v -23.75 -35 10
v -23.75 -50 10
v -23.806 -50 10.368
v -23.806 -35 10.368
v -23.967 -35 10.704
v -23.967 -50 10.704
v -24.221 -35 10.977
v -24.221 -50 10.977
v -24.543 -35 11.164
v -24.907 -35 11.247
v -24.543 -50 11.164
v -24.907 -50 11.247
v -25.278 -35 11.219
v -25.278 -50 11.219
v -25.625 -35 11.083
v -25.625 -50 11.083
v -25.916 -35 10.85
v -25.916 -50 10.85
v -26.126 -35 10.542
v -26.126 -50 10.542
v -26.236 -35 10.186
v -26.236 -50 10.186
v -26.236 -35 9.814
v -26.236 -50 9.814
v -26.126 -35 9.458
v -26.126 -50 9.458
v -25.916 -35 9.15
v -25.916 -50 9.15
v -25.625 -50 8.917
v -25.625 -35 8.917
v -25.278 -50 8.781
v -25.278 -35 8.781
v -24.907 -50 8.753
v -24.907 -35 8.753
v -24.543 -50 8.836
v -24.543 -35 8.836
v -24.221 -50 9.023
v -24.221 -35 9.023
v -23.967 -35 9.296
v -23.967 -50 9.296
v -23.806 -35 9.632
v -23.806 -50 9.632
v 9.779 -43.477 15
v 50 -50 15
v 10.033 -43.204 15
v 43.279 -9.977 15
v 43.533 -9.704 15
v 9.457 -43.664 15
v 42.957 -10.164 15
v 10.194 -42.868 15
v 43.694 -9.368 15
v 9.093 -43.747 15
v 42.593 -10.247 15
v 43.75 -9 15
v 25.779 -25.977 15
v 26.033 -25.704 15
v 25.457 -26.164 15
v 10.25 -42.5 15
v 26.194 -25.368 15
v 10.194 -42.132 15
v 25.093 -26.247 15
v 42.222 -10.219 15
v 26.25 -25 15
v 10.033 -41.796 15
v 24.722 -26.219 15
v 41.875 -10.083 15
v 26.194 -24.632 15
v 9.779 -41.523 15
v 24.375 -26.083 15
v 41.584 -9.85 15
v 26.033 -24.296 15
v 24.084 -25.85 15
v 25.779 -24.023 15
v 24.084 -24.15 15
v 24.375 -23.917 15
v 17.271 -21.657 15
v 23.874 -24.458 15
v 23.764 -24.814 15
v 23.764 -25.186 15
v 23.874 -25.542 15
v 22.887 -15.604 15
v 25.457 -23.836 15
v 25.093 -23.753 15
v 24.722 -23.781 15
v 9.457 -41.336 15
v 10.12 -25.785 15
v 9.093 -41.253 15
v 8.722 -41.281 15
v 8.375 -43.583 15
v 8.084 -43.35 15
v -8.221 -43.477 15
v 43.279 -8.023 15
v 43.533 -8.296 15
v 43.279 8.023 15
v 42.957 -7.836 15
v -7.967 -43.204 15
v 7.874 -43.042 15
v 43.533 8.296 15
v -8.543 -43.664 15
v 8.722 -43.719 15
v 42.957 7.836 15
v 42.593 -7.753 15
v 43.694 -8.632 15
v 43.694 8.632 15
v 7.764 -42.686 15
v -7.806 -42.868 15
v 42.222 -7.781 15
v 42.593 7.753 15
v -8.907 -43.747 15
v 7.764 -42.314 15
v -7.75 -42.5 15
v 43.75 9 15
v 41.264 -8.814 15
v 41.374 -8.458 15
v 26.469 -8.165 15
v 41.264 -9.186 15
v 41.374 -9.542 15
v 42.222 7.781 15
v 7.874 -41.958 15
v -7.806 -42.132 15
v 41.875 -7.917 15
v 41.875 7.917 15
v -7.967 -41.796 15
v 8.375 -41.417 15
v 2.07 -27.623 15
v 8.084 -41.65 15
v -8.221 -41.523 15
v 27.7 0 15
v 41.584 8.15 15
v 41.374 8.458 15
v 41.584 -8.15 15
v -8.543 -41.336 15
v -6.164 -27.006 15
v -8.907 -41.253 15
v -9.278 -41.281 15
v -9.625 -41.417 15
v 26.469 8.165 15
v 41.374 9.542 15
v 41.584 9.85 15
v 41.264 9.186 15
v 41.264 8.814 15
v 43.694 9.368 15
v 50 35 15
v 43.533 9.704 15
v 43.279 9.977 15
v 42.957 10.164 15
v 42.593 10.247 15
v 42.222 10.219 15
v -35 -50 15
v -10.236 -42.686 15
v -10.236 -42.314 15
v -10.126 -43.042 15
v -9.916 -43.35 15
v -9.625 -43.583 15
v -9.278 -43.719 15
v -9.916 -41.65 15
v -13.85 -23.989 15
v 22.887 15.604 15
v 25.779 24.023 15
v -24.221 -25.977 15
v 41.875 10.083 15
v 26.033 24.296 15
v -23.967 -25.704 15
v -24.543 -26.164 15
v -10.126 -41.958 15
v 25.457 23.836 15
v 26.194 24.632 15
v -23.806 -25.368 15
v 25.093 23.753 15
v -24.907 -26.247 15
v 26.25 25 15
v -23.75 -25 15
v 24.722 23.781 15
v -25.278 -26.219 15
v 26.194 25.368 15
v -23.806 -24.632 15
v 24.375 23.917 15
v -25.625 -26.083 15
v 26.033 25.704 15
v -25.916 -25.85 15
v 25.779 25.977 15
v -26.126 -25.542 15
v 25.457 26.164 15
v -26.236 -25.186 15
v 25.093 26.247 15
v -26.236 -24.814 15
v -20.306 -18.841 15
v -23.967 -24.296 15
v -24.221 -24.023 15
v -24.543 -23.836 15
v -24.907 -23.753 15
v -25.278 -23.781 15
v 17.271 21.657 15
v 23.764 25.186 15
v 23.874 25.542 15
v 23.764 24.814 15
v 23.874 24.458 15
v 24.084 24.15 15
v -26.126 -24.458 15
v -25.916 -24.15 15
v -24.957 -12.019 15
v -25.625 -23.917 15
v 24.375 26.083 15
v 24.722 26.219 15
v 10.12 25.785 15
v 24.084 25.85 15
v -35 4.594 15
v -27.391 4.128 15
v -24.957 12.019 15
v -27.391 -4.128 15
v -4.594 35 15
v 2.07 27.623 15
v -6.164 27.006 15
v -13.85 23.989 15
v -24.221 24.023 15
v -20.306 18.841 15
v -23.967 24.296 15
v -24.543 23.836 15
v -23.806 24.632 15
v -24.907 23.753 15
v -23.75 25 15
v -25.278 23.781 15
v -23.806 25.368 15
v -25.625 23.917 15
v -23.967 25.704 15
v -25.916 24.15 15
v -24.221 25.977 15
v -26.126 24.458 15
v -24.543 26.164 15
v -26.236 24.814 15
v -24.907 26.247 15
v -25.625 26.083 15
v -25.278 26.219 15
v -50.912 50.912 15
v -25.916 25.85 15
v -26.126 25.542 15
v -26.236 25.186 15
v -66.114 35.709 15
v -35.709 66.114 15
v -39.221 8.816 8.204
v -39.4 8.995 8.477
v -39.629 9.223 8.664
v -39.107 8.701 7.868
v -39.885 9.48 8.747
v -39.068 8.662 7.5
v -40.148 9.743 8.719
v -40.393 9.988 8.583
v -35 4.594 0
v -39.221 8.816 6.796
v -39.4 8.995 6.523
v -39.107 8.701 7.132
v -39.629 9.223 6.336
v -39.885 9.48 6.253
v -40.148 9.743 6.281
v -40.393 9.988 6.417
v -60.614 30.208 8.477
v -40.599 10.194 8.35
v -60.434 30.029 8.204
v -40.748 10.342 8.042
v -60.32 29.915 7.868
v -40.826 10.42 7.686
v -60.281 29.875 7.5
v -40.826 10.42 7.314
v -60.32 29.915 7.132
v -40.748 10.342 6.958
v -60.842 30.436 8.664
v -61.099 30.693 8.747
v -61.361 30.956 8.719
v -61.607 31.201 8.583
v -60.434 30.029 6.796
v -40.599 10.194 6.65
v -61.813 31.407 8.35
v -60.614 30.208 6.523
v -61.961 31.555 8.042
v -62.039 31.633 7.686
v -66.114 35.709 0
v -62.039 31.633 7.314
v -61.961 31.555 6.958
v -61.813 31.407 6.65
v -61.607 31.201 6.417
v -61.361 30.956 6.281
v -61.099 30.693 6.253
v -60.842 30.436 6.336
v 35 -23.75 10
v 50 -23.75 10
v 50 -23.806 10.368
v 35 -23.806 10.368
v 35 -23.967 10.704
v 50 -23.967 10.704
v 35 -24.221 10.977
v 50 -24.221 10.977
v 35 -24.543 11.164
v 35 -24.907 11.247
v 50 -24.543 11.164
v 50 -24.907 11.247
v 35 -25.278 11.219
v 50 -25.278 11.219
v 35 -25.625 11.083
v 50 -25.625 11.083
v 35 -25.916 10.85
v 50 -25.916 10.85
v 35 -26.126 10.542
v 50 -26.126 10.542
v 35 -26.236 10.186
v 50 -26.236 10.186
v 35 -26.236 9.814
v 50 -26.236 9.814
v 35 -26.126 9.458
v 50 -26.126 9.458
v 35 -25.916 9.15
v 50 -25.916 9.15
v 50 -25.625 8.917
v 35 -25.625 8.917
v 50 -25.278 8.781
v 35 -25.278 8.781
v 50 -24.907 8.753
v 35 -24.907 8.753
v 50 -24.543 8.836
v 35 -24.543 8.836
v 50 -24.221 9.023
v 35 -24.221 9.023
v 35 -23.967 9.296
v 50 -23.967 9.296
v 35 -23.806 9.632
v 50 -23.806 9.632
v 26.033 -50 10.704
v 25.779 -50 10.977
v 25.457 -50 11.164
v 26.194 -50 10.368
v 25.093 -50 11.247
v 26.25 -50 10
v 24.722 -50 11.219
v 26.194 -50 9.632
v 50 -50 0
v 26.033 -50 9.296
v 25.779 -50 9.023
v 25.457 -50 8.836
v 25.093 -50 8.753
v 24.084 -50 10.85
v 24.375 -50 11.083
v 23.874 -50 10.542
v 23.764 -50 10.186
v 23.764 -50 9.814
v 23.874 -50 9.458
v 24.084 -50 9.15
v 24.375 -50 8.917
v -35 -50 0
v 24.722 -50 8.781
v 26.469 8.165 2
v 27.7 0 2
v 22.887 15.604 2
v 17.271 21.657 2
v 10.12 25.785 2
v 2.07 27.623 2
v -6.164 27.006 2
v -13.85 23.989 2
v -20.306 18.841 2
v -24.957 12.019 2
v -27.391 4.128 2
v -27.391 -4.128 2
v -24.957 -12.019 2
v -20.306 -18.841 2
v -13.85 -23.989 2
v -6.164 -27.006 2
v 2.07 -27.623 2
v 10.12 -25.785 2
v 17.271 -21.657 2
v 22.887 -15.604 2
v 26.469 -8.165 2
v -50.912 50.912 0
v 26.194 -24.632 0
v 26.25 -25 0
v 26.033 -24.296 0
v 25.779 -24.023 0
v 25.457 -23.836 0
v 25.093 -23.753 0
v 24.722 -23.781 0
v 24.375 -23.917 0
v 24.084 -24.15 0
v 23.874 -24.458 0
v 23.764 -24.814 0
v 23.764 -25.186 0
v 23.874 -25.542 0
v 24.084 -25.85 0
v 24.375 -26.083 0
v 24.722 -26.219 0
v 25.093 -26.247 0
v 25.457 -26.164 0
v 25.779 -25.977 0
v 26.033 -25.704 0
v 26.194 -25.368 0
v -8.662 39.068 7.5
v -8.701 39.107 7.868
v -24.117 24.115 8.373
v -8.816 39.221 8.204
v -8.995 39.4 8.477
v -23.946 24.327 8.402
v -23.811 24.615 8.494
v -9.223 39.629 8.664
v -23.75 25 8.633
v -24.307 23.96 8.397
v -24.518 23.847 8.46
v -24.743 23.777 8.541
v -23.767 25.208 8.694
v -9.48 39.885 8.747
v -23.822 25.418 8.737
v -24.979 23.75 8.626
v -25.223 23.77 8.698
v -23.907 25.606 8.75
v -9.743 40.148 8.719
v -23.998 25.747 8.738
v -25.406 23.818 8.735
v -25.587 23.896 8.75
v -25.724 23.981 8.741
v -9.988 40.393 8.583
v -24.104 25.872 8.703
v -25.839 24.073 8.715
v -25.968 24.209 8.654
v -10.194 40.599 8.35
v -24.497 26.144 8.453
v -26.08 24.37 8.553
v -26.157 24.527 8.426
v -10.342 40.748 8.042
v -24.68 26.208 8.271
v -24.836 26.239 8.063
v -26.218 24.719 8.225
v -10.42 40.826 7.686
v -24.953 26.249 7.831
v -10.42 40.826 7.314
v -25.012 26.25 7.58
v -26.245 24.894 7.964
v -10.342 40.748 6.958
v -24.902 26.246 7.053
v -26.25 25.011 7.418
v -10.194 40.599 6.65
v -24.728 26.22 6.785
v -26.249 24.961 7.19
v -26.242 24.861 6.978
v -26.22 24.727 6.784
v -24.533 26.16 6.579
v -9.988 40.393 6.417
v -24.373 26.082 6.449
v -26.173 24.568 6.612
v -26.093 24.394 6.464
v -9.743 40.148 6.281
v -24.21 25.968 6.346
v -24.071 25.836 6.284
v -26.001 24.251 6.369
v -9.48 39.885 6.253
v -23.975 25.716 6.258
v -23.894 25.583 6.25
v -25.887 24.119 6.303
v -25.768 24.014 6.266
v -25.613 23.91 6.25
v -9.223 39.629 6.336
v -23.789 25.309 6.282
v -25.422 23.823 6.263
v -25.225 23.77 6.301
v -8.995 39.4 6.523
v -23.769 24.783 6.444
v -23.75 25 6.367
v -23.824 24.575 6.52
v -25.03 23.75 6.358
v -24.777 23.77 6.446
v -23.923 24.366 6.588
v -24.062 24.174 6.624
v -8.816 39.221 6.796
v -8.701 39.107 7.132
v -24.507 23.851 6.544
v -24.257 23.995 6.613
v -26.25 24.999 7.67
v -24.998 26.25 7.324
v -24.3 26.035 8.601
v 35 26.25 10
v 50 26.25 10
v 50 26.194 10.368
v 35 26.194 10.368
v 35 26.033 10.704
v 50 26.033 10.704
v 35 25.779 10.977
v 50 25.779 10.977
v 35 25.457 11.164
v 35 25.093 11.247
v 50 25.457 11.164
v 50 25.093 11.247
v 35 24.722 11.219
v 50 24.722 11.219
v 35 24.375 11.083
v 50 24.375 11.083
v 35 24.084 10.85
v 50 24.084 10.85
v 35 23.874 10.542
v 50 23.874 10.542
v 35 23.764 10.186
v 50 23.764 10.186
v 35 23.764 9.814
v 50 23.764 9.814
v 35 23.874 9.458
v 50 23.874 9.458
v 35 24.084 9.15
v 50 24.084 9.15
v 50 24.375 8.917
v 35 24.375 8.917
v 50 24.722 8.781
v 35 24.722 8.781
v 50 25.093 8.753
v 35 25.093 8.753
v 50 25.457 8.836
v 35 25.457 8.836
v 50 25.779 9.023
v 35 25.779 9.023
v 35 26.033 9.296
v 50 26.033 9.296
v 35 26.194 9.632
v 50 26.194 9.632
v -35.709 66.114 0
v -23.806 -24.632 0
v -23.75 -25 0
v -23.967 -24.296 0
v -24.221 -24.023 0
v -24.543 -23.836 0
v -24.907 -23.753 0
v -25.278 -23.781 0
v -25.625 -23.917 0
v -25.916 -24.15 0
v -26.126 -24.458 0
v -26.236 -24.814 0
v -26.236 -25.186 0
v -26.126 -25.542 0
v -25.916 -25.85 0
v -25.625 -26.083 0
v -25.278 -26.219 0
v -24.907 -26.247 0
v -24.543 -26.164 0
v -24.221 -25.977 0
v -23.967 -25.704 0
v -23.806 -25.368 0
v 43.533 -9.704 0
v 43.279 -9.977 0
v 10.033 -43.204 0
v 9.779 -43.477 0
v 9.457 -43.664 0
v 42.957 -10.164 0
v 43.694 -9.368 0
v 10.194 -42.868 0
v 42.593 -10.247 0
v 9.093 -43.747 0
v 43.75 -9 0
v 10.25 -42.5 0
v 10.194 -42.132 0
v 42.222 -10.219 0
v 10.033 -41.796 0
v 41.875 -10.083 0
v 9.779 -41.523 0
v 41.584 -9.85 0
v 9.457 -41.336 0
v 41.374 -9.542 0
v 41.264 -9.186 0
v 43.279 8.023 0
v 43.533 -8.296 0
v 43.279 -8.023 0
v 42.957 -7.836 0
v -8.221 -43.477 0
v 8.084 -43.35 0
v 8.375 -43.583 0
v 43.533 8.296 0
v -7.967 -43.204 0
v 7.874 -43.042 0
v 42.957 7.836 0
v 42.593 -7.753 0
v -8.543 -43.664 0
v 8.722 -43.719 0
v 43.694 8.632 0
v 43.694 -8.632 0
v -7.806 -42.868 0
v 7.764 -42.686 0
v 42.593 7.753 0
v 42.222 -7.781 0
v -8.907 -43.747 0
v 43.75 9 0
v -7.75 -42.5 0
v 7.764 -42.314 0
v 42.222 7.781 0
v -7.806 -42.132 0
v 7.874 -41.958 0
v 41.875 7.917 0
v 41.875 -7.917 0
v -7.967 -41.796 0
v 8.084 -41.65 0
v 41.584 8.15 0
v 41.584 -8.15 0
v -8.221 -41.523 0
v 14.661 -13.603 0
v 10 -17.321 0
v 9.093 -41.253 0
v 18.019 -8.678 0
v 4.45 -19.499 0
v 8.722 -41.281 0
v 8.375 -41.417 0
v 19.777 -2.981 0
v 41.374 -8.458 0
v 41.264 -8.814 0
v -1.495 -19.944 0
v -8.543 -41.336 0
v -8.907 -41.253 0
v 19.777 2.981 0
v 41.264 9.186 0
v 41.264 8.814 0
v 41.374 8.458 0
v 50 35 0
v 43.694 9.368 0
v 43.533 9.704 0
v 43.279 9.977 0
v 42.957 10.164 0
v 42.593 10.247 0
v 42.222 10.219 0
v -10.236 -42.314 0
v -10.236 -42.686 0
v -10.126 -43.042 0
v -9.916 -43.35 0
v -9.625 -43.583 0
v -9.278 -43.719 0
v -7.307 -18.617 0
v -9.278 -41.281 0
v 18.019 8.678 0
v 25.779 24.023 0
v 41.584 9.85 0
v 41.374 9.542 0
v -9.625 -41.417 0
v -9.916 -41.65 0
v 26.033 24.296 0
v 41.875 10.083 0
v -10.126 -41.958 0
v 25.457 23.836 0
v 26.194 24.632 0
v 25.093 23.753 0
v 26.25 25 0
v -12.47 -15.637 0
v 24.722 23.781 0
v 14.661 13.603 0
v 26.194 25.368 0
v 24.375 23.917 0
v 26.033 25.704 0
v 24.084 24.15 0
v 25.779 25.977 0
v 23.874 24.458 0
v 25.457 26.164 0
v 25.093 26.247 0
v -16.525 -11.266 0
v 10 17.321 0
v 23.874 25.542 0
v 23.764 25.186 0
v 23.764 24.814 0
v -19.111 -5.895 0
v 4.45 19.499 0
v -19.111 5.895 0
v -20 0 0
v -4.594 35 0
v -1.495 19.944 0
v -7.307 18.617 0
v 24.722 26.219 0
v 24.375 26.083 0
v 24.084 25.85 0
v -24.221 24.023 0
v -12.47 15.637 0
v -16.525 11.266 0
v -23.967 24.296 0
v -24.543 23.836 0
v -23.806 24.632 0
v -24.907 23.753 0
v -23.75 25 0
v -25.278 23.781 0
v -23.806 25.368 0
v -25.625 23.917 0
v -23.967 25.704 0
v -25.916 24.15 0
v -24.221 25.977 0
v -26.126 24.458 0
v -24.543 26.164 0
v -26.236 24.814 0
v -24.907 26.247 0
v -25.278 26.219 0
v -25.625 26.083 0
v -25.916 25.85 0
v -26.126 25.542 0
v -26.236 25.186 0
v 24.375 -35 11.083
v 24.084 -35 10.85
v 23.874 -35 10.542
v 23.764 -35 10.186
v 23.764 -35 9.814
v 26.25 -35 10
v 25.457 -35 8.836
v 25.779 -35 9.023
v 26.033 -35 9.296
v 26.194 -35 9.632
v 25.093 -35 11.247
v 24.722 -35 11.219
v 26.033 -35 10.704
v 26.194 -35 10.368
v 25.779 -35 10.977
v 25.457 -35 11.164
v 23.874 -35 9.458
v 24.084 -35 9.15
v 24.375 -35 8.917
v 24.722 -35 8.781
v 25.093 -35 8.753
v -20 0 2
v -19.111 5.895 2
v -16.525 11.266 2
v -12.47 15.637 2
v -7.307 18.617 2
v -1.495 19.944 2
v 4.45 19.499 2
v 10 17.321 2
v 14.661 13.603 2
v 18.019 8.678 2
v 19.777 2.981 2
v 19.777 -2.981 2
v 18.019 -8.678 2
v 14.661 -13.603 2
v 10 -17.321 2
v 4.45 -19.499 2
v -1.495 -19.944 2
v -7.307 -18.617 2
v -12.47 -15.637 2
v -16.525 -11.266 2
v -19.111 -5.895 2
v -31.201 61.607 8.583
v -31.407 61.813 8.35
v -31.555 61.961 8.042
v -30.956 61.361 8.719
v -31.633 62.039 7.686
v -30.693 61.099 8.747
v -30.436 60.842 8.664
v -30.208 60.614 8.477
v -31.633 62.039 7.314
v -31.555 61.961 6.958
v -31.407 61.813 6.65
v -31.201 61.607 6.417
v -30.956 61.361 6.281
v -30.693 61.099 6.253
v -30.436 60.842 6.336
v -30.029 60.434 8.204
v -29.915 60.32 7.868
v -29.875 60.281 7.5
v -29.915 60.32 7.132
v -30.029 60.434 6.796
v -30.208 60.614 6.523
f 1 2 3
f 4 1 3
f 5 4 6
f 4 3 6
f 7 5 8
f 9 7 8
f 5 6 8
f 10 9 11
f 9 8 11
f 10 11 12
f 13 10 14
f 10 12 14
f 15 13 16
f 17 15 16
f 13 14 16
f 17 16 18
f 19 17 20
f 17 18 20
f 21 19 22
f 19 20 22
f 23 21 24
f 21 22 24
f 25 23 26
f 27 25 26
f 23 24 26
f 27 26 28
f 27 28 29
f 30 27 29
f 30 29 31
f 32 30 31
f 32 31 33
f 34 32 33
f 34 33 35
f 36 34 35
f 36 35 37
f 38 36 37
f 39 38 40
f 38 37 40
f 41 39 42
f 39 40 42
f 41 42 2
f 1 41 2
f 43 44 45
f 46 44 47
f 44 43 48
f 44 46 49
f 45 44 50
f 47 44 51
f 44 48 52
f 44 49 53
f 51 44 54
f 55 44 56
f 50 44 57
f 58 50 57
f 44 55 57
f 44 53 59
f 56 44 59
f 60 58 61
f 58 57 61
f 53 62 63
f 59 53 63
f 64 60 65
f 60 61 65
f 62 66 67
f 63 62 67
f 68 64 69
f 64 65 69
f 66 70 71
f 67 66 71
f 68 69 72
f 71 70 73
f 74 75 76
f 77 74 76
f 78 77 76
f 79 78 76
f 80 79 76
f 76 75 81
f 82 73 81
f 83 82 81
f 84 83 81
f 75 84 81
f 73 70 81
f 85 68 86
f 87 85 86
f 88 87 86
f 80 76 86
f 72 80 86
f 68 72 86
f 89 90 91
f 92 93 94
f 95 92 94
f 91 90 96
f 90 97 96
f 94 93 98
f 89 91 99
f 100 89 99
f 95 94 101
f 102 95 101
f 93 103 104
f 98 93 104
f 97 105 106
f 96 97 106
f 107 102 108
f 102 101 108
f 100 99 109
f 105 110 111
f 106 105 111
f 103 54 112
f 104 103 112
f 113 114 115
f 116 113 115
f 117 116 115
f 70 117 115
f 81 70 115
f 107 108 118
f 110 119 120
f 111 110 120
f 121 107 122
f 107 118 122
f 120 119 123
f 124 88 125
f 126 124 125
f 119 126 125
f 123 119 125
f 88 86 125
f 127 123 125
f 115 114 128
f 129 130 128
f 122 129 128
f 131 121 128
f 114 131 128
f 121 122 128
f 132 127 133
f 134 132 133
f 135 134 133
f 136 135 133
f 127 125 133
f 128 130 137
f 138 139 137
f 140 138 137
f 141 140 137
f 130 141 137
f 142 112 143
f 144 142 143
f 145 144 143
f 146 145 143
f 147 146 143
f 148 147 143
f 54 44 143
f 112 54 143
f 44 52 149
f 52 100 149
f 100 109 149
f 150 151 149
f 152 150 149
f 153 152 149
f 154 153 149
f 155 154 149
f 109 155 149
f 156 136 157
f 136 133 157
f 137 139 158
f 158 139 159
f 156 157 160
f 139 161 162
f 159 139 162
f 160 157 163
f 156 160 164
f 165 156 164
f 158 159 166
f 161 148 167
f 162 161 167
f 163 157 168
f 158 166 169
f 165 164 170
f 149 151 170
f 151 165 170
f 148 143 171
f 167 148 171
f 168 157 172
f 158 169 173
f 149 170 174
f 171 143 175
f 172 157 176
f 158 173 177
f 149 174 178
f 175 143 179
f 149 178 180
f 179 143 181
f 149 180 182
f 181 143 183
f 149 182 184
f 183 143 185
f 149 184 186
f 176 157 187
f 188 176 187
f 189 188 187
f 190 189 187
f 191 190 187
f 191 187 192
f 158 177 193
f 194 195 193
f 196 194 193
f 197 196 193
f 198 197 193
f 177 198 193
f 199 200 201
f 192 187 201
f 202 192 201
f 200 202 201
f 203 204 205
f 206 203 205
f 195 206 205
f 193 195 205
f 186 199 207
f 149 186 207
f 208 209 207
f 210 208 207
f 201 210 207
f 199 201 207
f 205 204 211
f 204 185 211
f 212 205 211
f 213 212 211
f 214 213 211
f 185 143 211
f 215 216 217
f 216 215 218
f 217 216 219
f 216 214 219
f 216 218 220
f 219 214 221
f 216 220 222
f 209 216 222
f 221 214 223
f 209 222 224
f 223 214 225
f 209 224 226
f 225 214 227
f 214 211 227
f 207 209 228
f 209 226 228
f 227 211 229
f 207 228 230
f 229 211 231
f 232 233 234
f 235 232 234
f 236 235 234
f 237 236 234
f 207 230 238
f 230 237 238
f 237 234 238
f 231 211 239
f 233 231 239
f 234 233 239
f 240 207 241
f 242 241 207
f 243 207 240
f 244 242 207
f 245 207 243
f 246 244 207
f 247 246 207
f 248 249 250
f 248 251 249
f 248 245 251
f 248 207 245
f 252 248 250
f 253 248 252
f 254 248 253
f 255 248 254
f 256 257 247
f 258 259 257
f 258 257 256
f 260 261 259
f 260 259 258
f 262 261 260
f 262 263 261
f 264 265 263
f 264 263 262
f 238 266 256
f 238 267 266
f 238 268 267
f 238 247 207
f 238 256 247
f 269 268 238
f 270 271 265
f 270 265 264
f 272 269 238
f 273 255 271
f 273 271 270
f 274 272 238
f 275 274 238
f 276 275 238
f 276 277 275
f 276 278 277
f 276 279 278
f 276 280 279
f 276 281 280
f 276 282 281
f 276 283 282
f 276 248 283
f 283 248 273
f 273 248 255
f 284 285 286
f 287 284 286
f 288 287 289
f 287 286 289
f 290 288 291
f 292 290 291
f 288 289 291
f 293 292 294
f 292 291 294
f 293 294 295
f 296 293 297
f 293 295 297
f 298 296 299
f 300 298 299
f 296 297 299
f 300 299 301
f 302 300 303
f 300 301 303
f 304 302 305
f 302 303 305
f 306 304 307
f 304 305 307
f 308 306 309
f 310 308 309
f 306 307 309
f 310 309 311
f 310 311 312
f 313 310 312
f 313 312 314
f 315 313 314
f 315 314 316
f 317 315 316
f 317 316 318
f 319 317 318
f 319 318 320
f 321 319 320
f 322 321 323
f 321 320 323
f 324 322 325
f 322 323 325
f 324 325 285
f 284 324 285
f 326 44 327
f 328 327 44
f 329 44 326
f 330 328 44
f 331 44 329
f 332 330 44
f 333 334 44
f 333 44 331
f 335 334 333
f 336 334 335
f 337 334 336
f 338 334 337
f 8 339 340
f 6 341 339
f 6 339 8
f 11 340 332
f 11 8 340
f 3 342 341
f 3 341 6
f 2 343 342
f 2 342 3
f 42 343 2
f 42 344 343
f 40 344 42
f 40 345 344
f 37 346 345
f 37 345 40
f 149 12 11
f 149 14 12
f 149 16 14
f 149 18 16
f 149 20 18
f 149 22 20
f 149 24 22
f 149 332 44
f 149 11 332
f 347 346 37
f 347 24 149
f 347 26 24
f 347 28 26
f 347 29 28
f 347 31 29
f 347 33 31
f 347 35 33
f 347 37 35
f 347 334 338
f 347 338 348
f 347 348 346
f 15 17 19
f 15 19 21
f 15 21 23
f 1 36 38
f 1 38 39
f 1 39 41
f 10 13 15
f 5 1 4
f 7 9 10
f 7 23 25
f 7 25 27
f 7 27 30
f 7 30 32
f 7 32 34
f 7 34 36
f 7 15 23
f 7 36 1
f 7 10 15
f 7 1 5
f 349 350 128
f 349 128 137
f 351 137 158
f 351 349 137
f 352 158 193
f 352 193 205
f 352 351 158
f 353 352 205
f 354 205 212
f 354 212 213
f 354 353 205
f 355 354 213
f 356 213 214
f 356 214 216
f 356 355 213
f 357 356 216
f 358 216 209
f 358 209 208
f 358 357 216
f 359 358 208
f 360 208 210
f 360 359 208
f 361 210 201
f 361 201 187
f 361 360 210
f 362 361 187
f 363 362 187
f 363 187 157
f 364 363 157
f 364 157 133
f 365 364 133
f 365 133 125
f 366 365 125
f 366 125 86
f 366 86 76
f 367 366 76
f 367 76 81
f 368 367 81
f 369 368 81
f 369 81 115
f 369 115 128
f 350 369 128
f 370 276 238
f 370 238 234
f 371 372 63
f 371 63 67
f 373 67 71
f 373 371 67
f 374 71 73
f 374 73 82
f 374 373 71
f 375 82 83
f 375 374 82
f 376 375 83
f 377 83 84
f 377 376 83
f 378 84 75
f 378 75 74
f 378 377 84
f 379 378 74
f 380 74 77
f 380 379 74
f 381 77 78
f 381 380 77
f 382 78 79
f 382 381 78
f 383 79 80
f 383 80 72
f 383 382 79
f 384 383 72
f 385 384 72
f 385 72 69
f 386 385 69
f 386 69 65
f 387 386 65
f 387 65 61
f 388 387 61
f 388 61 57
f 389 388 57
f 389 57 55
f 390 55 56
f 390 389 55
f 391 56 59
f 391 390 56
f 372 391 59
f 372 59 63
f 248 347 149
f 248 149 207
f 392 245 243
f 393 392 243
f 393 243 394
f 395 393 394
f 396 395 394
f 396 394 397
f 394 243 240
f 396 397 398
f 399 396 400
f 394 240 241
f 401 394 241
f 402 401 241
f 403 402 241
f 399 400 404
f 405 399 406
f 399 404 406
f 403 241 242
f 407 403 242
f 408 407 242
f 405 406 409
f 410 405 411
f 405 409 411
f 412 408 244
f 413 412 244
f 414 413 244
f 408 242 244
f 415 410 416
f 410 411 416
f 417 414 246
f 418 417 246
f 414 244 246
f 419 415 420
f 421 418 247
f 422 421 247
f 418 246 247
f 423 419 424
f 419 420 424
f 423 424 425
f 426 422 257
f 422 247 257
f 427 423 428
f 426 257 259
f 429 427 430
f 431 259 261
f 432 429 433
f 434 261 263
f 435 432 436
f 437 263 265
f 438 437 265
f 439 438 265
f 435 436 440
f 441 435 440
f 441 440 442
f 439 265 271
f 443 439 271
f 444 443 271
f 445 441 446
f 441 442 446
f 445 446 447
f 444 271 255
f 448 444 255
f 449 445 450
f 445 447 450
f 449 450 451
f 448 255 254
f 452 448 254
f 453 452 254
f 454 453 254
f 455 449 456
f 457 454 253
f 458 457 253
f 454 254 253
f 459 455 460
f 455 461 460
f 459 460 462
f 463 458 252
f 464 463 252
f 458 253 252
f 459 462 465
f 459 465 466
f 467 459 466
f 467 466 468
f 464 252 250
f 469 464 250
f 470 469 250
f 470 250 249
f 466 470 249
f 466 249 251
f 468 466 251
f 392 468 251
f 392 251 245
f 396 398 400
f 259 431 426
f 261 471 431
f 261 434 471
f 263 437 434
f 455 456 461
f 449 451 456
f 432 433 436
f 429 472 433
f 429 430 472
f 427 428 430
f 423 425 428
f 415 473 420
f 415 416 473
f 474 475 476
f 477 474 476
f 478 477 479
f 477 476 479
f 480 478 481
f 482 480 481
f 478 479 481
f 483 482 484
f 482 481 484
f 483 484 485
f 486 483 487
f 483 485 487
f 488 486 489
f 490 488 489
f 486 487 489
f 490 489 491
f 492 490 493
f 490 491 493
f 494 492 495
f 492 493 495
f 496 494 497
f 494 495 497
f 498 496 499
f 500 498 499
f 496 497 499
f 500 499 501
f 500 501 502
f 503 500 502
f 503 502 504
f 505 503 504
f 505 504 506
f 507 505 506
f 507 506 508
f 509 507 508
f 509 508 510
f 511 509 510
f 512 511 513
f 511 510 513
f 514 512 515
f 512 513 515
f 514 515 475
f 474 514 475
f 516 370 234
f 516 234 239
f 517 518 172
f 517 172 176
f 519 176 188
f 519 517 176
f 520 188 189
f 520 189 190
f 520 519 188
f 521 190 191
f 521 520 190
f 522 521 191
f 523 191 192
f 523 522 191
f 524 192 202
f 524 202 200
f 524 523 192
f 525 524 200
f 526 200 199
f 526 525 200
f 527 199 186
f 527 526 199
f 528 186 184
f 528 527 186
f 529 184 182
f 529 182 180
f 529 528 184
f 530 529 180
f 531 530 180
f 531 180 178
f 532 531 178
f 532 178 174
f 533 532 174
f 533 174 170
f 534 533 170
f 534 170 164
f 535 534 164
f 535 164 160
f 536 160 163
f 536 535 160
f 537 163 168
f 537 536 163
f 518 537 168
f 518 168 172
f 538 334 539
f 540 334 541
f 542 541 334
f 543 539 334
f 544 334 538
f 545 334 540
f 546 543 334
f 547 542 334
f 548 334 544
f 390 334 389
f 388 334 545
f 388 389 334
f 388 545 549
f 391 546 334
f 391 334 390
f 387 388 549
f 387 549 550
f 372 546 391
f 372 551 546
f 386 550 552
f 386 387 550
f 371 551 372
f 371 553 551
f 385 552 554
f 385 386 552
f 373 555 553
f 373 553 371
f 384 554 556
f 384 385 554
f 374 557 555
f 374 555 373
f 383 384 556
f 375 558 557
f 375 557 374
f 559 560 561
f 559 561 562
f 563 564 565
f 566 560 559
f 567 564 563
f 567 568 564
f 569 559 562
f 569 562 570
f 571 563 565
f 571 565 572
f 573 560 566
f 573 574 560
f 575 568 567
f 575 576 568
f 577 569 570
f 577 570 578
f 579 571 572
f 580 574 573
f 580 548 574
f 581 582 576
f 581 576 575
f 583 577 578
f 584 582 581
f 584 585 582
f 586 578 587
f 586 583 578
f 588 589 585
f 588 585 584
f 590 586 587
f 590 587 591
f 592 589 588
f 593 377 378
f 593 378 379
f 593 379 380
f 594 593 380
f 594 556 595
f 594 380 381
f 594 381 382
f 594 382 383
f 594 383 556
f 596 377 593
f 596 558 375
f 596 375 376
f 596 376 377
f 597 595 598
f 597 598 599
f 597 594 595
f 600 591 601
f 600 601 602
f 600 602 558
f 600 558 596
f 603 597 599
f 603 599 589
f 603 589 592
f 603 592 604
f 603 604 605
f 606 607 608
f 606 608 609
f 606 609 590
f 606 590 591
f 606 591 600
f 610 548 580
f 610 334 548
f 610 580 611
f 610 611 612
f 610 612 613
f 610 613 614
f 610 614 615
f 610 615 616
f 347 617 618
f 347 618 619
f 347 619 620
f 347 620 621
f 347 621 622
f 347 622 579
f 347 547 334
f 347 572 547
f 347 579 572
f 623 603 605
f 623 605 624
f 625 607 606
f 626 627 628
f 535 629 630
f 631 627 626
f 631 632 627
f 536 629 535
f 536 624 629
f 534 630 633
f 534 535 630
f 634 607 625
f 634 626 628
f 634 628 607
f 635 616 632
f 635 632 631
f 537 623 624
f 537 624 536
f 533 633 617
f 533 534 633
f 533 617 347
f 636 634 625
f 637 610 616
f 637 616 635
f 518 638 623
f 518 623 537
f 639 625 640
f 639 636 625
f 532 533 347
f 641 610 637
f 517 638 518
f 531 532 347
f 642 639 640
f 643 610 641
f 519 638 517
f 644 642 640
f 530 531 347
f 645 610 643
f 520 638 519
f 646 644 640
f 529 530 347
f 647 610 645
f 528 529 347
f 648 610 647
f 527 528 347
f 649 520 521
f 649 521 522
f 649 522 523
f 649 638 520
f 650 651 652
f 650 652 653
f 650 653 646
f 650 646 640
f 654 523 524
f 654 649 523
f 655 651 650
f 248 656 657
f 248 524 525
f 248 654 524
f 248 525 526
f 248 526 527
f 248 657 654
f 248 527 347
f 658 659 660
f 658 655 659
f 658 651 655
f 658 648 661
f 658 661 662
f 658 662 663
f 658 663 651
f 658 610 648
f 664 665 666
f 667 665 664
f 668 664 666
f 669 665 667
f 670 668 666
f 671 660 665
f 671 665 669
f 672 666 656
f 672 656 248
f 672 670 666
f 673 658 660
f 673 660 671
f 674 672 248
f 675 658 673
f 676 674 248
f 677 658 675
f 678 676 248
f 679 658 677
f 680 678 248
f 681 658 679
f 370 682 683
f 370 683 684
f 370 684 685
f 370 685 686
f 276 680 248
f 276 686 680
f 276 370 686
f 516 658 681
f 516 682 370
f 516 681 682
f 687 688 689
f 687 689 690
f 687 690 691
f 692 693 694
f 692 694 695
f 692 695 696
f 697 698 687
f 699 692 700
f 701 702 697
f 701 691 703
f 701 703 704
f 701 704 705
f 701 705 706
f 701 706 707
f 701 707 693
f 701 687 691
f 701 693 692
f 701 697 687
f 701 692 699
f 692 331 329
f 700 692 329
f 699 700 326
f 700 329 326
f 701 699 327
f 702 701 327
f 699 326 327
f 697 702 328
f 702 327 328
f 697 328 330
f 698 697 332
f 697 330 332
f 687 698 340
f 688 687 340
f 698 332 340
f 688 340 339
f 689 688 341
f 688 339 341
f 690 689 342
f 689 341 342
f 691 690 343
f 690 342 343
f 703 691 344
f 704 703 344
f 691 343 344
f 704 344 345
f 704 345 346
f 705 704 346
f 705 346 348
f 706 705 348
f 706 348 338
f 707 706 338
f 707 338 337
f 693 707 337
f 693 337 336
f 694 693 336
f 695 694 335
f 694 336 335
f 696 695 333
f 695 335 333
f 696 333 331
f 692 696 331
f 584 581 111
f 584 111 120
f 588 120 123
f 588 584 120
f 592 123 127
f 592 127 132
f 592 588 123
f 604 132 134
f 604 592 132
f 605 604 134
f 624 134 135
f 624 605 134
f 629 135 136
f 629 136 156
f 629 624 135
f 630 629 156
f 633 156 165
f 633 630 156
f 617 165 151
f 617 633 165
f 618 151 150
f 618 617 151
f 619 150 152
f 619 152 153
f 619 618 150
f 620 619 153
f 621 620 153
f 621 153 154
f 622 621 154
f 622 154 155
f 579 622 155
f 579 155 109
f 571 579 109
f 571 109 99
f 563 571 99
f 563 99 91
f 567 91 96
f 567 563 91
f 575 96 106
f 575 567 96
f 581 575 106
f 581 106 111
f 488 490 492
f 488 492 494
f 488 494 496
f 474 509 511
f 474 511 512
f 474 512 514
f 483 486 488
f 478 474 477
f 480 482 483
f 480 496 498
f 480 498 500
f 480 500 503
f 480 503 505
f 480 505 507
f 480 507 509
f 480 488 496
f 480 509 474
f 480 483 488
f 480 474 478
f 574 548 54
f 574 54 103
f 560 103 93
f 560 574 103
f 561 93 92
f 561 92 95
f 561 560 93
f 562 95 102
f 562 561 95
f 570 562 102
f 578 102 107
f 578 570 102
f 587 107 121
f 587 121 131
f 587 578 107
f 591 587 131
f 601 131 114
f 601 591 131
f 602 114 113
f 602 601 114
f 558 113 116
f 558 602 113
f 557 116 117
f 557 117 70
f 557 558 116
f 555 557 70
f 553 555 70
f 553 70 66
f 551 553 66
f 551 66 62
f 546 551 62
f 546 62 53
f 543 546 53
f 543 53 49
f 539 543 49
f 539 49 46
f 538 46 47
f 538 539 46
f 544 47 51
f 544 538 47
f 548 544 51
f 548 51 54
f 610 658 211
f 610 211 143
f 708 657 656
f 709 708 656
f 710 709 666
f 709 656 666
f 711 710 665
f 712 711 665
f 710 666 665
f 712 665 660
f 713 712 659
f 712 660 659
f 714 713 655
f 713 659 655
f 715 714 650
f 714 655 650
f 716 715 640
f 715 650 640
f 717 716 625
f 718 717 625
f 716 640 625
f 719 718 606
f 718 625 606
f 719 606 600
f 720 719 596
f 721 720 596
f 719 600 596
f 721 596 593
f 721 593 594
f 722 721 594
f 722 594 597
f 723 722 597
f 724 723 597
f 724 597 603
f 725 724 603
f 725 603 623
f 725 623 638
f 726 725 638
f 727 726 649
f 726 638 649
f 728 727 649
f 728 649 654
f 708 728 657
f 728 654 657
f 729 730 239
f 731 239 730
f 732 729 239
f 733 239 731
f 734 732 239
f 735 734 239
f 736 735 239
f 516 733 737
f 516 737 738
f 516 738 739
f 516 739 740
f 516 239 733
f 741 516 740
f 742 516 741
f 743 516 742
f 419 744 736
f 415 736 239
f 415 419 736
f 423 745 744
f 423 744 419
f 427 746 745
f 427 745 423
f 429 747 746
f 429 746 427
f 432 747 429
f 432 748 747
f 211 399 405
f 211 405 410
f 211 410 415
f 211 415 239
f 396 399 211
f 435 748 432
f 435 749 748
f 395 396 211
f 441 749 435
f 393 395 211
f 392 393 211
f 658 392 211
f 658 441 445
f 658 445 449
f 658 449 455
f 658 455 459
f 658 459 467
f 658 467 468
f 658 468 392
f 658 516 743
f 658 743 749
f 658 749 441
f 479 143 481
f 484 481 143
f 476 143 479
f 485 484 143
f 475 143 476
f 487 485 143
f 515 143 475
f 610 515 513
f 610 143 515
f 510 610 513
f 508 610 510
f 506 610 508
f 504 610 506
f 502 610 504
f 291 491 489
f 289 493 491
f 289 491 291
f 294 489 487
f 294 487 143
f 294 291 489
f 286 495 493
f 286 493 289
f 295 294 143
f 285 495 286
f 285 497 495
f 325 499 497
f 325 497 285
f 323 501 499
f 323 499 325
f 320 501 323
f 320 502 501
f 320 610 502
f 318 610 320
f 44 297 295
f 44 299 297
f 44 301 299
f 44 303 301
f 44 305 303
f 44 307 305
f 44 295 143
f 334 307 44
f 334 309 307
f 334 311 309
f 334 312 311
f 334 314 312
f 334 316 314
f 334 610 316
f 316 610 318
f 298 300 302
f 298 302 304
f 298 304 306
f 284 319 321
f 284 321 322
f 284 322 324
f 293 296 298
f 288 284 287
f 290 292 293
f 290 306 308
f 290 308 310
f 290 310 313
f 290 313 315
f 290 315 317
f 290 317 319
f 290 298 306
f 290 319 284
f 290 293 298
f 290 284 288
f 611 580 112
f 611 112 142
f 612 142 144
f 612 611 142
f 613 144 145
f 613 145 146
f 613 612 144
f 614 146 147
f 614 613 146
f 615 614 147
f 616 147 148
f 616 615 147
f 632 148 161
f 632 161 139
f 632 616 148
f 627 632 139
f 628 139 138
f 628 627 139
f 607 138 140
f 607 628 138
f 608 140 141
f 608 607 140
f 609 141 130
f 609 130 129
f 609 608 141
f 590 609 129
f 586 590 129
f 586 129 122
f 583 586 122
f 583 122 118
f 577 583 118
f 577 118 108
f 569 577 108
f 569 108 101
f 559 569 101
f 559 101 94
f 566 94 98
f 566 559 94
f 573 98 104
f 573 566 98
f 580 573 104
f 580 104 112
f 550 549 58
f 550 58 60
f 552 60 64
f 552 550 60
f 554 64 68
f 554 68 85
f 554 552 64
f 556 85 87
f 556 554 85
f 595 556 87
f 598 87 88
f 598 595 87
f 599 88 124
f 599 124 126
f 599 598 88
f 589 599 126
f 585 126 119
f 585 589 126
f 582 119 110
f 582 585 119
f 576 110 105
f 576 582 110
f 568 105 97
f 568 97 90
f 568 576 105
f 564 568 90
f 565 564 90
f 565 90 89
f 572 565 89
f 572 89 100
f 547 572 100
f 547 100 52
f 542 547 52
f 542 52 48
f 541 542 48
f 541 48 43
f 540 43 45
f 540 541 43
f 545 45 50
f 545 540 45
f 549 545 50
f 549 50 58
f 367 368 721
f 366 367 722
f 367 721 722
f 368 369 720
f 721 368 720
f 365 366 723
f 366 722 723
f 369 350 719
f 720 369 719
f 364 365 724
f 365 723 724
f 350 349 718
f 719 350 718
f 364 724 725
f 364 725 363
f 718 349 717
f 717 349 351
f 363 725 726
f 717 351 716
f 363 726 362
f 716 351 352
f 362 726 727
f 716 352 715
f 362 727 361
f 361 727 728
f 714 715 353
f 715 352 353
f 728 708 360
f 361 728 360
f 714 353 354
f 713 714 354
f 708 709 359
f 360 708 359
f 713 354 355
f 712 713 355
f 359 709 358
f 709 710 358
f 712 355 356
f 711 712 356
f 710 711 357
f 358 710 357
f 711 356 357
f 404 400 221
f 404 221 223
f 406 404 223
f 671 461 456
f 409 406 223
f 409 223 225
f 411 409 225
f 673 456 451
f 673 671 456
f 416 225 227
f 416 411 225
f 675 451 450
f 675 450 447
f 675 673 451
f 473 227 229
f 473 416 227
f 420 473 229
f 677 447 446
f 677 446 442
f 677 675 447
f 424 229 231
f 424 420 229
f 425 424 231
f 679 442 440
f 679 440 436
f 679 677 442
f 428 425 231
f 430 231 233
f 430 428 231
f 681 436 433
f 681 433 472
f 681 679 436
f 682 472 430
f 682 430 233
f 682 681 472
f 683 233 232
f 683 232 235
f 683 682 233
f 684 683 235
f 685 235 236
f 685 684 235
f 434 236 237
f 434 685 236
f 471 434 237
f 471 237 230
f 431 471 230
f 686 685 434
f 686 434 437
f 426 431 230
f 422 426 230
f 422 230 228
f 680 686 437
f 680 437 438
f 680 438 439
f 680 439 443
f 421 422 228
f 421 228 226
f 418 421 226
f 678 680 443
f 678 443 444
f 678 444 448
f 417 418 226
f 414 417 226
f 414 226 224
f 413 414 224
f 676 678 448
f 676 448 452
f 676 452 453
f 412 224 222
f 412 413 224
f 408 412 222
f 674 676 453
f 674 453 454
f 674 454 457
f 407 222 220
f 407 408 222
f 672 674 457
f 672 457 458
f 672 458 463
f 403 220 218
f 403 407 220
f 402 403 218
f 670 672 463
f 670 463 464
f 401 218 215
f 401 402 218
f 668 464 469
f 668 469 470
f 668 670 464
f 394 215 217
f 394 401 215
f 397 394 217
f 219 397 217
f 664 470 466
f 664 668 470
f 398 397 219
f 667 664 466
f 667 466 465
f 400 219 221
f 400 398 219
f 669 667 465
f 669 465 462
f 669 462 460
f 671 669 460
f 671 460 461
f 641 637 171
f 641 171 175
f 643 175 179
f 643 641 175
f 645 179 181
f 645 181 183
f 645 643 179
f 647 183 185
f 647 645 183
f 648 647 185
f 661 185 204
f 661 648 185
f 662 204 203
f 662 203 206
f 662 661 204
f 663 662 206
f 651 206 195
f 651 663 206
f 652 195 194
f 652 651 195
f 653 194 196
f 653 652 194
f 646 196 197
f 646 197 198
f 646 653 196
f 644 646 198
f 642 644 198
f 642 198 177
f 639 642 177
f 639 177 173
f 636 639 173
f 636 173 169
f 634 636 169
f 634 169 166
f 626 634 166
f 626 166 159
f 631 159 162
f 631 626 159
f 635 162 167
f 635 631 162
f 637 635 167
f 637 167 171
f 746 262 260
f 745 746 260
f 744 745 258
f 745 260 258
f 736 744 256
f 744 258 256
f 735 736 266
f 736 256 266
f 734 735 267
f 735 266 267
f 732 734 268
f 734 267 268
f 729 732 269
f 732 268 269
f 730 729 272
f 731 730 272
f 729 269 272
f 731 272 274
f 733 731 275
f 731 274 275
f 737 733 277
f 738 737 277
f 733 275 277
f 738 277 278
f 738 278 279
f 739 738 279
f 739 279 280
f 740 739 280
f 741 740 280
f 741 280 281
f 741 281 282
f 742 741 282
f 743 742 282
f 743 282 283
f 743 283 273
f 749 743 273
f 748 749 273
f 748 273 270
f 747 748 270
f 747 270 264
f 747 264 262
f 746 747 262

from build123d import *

# Parameters (mm, degrees)
SKETCH1_R           = 27.7
SKETCH1_R_2         = 1.25
BOSS_EXTRUDE1_DEPTH = 15
CUT_EXTRUDE1_REACH  = 107.304
SKETCH2_R           = 1.25
SKETCH6_R           = 27.7
SKETCH6_R_2         = 20
BOSS_EXTRUDE4_DEPTH = 2
SKETCH7_R           = 1.25
CUT_EXTRUDE2_DEPTH  = 15
SKETCH8_R           = 1.25
CUT_EXTRUDE3_DEPTH  = 15


with BuildPart() as part:
    # Sketch1 → Boss-Extrude1 (new body)
    with BuildSketch(Plane.XY):
        Polygon((50, 35), (50, -50), (-35, -50), (-35, 4.594408409), (-66.114484041, 35.70889245), (-50.911688245, 50.911688245), (-35.70889245, 66.114484041), (-4.594408409, 35), align=None)
        Circle(SKETCH1_R, mode=Mode.SUBTRACT)
        with Locations((-25, 25)):
            Circle(SKETCH1_R_2, mode=Mode.SUBTRACT)
        with Locations((25, 25)):
            Circle(SKETCH1_R_2, mode=Mode.SUBTRACT)
        with Locations((25, -25)):
            Circle(SKETCH1_R_2, mode=Mode.SUBTRACT)
        with Locations((-25, -25)):
            Circle(SKETCH1_R_2, mode=Mode.SUBTRACT)
        with Locations((42.5, 9)):
            Circle(SKETCH1_R_2, mode=Mode.SUBTRACT)
        with Locations((42.5, -9)):
            Circle(SKETCH1_R_2, mode=Mode.SUBTRACT)
        with Locations((9, -42.5)):
            Circle(SKETCH1_R_2, mode=Mode.SUBTRACT)
        with Locations((-9, -42.5)):
            Circle(SKETCH1_R_2, mode=Mode.SUBTRACT)
    extrude(amount=BOSS_EXTRUDE1_DEPTH)

    # Sketch2 → Cut-Extrude1 (cut, up to next)
    with BuildSketch(Plane(origin=(-15.202795796, -15.202795796, 0), x_dir=(0, 0, 1), z_dir=(-0.7071067811865472, -0.7071067811865478, 0)), mode=Mode.PRIVATE) as cut_extrude1_sk1:
        with Locations(Location((7.5, 65, 0), (0, 0, 270))):
            Circle(SKETCH2_R)
    cut_extrude1_tool1 = extrude(cut_extrude1_sk1.sketch, amount=-CUT_EXTRUDE1_REACH, mode=Mode.PRIVATE) & part.part
    # Sketch2 → Cut-Extrude1 (cut, up to next)
    with BuildSketch(Plane(origin=(-15.202795796, -15.202795796, 0), x_dir=(0, 0, 1), z_dir=(-0.7071067811865472, -0.7071067811865478, 0)), mode=Mode.PRIVATE) as cut_extrude1_sk2:
        with Locations(Location((7.5, 35, 0), (0, 0, 270))):
            Circle(SKETCH2_R)
    cut_extrude1_tool2 = extrude(cut_extrude1_sk2.sketch, amount=-CUT_EXTRUDE1_REACH, mode=Mode.PRIVATE) & part.part
    add(cut_extrude1_tool1.solids().sort_by_distance((-61.164737, 30.759145, 7.5))[0], mode=Mode.SUBTRACT)
    add(cut_extrude1_tool2.solids().sort_by_distance((-39.951533, 9.545942, 7.5))[0], mode=Mode.SUBTRACT)

    # Sketch6 → Boss-Extrude4 (add)
    with BuildSketch(Plane(origin=(0, 0, 0), x_dir=(-1, 0, 0), z_dir=(0, 0, -1))):
        Circle(SKETCH6_R)
        Circle(SKETCH6_R_2, mode=Mode.SUBTRACT)
    extrude(amount=-BOSS_EXTRUDE4_DEPTH)

    # Sketch7 → Cut-Extrude2 (cut)
    with BuildSketch(Plane.XZ.offset(50)):
        with Locations((25, 10)):
            Circle(SKETCH7_R)
        with Locations((-25, 10)):
            Circle(SKETCH7_R)
    extrude(amount=-CUT_EXTRUDE2_DEPTH, mode=Mode.SUBTRACT)

    # Sketch8 → Cut-Extrude3 (cut)
    with BuildSketch(Plane(origin=(50, 0, 0), x_dir=(0, 0, -1), z_dir=(1, 0, 0))):
        with Locations(Location((-10, -25, 0), (0, 0, 90))):
            Circle(SKETCH8_R)
        with Locations(Location((-10, 25, 0), (0, 0, 90))):
            Circle(SKETCH8_R)
    extrude(amount=-CUT_EXTRUDE3_DEPTH, mode=Mode.SUBTRACT)


solid = part.part
